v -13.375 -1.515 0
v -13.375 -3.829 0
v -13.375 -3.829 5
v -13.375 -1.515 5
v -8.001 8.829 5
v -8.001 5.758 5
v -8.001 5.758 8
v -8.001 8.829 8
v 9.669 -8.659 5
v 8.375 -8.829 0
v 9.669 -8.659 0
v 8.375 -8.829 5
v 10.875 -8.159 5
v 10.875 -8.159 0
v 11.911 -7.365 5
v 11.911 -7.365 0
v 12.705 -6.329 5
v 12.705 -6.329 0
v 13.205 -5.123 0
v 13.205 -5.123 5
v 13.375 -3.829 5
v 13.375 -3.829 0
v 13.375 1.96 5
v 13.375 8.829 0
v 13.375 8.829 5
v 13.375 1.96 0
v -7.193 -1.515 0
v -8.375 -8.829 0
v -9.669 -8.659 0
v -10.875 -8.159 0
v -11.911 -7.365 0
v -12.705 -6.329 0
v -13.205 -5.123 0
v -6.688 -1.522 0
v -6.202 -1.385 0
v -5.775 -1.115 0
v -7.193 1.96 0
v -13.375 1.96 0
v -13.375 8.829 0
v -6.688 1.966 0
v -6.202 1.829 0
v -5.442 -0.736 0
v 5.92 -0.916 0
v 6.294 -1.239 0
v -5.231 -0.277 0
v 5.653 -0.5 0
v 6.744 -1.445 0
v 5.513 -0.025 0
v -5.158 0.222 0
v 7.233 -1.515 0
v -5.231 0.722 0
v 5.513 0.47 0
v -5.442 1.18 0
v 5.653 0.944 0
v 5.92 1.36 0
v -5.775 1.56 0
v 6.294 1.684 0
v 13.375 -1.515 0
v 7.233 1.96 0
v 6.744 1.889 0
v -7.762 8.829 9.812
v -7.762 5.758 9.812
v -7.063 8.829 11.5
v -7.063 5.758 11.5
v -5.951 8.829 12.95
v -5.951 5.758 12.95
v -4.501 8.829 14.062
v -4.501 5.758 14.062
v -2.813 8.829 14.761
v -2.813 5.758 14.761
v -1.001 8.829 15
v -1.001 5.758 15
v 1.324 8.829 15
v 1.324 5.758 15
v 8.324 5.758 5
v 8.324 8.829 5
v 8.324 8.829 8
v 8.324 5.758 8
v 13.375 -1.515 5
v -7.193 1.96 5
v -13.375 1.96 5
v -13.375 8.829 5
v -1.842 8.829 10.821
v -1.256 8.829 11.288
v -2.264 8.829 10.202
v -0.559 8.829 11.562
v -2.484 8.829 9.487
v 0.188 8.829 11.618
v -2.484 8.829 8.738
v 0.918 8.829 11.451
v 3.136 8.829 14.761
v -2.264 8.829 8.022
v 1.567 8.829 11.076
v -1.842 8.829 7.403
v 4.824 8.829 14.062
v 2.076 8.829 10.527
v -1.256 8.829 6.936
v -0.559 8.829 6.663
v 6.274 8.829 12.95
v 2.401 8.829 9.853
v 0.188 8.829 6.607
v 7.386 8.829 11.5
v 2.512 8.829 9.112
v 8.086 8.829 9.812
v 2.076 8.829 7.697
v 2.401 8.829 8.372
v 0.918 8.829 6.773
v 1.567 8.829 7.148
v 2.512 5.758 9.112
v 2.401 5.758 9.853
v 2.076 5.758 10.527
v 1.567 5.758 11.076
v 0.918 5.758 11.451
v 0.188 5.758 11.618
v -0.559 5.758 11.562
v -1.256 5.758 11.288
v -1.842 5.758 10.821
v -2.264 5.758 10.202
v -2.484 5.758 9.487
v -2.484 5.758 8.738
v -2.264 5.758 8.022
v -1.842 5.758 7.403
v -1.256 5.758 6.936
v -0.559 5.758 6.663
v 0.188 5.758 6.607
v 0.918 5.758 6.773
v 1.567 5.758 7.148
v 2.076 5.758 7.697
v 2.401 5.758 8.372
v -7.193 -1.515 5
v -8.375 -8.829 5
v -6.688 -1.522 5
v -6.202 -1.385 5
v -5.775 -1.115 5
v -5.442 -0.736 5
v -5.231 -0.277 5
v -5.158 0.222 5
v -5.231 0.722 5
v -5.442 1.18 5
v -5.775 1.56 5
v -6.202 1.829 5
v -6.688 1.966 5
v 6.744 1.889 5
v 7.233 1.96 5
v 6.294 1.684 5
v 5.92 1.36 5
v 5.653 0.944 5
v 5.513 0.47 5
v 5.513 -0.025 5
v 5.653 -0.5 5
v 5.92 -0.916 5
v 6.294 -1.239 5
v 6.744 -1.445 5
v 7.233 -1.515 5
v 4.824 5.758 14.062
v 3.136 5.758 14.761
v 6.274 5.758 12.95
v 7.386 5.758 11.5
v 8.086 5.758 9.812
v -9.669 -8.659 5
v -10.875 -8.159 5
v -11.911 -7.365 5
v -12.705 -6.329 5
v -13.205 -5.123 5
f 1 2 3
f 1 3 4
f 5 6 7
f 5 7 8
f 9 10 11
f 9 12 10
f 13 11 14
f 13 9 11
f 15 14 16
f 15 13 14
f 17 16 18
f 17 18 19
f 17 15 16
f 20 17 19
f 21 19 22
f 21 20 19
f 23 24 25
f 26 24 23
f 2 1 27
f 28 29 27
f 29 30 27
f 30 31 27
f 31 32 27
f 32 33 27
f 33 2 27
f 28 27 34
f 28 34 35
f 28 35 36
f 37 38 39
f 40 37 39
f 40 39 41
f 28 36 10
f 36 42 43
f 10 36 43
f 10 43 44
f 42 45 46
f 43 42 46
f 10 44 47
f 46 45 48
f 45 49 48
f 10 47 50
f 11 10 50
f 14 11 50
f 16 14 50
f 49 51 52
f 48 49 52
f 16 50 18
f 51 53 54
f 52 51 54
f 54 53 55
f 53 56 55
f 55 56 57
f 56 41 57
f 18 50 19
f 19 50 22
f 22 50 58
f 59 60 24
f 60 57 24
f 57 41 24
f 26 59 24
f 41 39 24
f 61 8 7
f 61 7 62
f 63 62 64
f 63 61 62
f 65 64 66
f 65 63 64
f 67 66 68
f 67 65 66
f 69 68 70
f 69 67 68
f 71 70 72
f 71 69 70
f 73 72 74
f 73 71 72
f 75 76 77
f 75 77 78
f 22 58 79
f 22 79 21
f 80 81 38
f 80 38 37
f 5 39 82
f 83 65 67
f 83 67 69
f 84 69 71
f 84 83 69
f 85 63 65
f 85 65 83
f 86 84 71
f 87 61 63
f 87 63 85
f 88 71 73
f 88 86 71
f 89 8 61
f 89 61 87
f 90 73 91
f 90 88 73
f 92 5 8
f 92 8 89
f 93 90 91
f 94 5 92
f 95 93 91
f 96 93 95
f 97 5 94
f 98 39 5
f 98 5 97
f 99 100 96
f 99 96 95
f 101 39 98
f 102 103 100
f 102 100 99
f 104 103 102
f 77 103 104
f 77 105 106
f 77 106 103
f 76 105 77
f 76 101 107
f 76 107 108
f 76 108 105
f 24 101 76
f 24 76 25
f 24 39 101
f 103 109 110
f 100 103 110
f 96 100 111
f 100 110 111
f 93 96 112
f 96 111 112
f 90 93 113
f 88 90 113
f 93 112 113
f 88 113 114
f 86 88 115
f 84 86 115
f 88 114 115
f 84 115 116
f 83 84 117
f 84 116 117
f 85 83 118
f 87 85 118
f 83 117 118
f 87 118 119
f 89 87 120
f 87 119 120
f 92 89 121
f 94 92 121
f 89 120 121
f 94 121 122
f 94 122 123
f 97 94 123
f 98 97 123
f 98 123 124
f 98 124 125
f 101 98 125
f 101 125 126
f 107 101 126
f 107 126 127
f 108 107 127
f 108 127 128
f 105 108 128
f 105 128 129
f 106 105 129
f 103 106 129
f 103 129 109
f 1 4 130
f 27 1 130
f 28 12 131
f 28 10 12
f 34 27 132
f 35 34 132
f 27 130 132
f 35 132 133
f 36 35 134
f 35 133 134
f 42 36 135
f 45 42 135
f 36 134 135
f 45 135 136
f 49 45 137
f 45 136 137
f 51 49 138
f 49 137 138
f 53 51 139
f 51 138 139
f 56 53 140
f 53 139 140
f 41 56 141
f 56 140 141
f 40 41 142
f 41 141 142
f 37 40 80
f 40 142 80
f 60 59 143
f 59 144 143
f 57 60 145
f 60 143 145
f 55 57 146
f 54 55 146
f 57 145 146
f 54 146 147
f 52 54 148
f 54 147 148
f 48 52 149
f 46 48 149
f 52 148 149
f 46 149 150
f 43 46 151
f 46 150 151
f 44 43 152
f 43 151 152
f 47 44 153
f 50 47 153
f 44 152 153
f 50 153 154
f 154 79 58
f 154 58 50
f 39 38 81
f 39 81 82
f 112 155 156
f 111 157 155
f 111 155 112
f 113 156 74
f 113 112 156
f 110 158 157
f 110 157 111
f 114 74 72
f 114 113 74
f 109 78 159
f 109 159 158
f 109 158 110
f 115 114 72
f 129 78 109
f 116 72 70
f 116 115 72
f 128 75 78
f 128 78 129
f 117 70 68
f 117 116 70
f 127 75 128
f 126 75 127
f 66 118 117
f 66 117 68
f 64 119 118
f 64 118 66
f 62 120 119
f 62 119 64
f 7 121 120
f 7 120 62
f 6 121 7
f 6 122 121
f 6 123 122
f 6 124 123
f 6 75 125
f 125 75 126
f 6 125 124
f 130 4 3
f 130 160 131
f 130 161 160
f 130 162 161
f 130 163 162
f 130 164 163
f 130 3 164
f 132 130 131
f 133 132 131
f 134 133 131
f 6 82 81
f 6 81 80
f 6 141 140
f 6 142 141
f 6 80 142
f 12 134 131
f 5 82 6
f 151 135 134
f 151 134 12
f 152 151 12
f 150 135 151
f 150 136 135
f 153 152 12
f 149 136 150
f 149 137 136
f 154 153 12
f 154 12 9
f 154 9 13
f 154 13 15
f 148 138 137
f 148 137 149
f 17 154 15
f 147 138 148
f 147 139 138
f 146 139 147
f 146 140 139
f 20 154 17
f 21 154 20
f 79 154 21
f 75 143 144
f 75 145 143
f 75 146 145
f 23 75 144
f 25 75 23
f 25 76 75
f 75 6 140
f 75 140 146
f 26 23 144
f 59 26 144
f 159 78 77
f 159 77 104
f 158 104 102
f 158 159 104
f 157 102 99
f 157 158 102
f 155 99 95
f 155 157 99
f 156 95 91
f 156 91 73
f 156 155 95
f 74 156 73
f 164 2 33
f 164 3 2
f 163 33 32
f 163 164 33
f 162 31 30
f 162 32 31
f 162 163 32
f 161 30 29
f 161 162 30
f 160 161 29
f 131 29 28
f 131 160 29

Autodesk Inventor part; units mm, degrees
ref_plane "YZ Plane" through (0, 0, 0) normal (1, 0, 0) x (0, 1, 0)
ref_plane "XZ Plane" through (0, 0, 0) normal (0, 1, 0) x (-1, 0, 0)
ref_plane "XY Plane" through (0, 0, 0) normal (0, 0, 1) x (1, 0, 0)
sketch "스케치1" plane through (0, 0, 0) normal (0, 0, 1) x (1, 0, 0)
  line L0 (13.3752, -8.8292) -> (-13.3752, -8.8292)
  line L1 (-13.3752, -8.8292) -> (-13.3752, 8.8292)
  line L2 (-13.3752, 8.8292) -> (13.3752, 8.8292)
  line L3 (13.3752, 8.8292) -> (13.3752, -8.8292)
  line L4 (13.3752, -8.8292) -> (-13.3752, 8.8292) construction
  line L5 (-13.3752, -8.8292) -> (13.3752, 8.8292) construction
  point P0 (0, 0)
extrude "돌출1" add sketch "스케치1" along normal blind 5
sketch "스케치2" plane through (0, 0, 5) normal (0, 0, 1) x (1, 0, 0)
  line L0 (13.3752, 8.8292) -> (-13.3752, 8.8292) projected
  line L1 (-8.0009, 8.8292) -> (8.3241, 8.8292)
  line L2 (8.3241, 8.8292) -> (8.3241, 5.7582)
  line L3 (8.3241, 5.7582) -> (-8.0009, 5.7582)
  line L4 (-8.0009, 5.7582) -> (-8.0009, 8.8292)
  line L5 (-13.3752, 8.8292) -> (-13.3752, -8.8292) projected
  line L6 (-13.3752, 1.9598) -> (-7.1927, 1.9598)
  line L7 (-13.3752, -1.5153) -> (-7.1927, -1.5153)
  arc A0 (-7.1927, -1.5153) -> (-7.1927, 1.9598) centre (-6.9174, 0.2222) ccw
  line L8 (13.3752, -8.8292) -> (13.3752, 8.8292) projected
  line L9 (13.3752, 1.9598) -> (7.2331, 1.9598)
  line L10 (13.3752, -1.5153) -> (7.2331, -1.5153)
  arc A1 (7.2331, 1.9598) -> (7.2331, -1.5153) centre (7.2331, 0.2222) ccw
  point P0 (0, 0)
extrude "돌출2" add sketch "스케치2" along normal blind 10 contours L2 L3 L4 L0
extrude "돌출3" cut sketch "스케치2" against normal blind 10 contours L6 A0 L7 L5 | L8 L10 A1 L9
sketch "스케치3" plane through (-8.0009, 5.7582, 5) normal (0, -1, 0) x (1, 0, 0)
  circle A0 centre (8.0009, 4.1121) radius 2.5125
  line L0 (0, 10) -> (16.325, 10) projected
  line L1 (0, 0) -> (0, 10) projected
  arc A1 (8.1625, 10) -> (0, 4.1121) centre (8.0451, 1.5609) ccw
  line L2 (16.325, 0) -> (16.325, 10) projected
  arc A2 (16.325, 4.1121) -> (8.1625, 10) centre (7.959, 1.1161) ccw
  point P0 (8.0009, -5)
extrude "돌출4" cut sketch "스케치3" against normal blind 10 contours A0
fillet "모깎기1" radius 5 2 edges at (13.3752, -8.8292, 2.5) (-13.3752, -8.8292, 2.5)
sketch "스케치4" plane through (-8.0009, 5.7582, 5) normal (0, -1, 0) x (1, 0, 0)
  point P0 (8.0009, -5)
fillet "모깎기2" radius 7 2 edges at (8.3241, 7.2937, 15) (-8.0009, 7.2937, 15)
properties part number "240531_3Dsketch01"
